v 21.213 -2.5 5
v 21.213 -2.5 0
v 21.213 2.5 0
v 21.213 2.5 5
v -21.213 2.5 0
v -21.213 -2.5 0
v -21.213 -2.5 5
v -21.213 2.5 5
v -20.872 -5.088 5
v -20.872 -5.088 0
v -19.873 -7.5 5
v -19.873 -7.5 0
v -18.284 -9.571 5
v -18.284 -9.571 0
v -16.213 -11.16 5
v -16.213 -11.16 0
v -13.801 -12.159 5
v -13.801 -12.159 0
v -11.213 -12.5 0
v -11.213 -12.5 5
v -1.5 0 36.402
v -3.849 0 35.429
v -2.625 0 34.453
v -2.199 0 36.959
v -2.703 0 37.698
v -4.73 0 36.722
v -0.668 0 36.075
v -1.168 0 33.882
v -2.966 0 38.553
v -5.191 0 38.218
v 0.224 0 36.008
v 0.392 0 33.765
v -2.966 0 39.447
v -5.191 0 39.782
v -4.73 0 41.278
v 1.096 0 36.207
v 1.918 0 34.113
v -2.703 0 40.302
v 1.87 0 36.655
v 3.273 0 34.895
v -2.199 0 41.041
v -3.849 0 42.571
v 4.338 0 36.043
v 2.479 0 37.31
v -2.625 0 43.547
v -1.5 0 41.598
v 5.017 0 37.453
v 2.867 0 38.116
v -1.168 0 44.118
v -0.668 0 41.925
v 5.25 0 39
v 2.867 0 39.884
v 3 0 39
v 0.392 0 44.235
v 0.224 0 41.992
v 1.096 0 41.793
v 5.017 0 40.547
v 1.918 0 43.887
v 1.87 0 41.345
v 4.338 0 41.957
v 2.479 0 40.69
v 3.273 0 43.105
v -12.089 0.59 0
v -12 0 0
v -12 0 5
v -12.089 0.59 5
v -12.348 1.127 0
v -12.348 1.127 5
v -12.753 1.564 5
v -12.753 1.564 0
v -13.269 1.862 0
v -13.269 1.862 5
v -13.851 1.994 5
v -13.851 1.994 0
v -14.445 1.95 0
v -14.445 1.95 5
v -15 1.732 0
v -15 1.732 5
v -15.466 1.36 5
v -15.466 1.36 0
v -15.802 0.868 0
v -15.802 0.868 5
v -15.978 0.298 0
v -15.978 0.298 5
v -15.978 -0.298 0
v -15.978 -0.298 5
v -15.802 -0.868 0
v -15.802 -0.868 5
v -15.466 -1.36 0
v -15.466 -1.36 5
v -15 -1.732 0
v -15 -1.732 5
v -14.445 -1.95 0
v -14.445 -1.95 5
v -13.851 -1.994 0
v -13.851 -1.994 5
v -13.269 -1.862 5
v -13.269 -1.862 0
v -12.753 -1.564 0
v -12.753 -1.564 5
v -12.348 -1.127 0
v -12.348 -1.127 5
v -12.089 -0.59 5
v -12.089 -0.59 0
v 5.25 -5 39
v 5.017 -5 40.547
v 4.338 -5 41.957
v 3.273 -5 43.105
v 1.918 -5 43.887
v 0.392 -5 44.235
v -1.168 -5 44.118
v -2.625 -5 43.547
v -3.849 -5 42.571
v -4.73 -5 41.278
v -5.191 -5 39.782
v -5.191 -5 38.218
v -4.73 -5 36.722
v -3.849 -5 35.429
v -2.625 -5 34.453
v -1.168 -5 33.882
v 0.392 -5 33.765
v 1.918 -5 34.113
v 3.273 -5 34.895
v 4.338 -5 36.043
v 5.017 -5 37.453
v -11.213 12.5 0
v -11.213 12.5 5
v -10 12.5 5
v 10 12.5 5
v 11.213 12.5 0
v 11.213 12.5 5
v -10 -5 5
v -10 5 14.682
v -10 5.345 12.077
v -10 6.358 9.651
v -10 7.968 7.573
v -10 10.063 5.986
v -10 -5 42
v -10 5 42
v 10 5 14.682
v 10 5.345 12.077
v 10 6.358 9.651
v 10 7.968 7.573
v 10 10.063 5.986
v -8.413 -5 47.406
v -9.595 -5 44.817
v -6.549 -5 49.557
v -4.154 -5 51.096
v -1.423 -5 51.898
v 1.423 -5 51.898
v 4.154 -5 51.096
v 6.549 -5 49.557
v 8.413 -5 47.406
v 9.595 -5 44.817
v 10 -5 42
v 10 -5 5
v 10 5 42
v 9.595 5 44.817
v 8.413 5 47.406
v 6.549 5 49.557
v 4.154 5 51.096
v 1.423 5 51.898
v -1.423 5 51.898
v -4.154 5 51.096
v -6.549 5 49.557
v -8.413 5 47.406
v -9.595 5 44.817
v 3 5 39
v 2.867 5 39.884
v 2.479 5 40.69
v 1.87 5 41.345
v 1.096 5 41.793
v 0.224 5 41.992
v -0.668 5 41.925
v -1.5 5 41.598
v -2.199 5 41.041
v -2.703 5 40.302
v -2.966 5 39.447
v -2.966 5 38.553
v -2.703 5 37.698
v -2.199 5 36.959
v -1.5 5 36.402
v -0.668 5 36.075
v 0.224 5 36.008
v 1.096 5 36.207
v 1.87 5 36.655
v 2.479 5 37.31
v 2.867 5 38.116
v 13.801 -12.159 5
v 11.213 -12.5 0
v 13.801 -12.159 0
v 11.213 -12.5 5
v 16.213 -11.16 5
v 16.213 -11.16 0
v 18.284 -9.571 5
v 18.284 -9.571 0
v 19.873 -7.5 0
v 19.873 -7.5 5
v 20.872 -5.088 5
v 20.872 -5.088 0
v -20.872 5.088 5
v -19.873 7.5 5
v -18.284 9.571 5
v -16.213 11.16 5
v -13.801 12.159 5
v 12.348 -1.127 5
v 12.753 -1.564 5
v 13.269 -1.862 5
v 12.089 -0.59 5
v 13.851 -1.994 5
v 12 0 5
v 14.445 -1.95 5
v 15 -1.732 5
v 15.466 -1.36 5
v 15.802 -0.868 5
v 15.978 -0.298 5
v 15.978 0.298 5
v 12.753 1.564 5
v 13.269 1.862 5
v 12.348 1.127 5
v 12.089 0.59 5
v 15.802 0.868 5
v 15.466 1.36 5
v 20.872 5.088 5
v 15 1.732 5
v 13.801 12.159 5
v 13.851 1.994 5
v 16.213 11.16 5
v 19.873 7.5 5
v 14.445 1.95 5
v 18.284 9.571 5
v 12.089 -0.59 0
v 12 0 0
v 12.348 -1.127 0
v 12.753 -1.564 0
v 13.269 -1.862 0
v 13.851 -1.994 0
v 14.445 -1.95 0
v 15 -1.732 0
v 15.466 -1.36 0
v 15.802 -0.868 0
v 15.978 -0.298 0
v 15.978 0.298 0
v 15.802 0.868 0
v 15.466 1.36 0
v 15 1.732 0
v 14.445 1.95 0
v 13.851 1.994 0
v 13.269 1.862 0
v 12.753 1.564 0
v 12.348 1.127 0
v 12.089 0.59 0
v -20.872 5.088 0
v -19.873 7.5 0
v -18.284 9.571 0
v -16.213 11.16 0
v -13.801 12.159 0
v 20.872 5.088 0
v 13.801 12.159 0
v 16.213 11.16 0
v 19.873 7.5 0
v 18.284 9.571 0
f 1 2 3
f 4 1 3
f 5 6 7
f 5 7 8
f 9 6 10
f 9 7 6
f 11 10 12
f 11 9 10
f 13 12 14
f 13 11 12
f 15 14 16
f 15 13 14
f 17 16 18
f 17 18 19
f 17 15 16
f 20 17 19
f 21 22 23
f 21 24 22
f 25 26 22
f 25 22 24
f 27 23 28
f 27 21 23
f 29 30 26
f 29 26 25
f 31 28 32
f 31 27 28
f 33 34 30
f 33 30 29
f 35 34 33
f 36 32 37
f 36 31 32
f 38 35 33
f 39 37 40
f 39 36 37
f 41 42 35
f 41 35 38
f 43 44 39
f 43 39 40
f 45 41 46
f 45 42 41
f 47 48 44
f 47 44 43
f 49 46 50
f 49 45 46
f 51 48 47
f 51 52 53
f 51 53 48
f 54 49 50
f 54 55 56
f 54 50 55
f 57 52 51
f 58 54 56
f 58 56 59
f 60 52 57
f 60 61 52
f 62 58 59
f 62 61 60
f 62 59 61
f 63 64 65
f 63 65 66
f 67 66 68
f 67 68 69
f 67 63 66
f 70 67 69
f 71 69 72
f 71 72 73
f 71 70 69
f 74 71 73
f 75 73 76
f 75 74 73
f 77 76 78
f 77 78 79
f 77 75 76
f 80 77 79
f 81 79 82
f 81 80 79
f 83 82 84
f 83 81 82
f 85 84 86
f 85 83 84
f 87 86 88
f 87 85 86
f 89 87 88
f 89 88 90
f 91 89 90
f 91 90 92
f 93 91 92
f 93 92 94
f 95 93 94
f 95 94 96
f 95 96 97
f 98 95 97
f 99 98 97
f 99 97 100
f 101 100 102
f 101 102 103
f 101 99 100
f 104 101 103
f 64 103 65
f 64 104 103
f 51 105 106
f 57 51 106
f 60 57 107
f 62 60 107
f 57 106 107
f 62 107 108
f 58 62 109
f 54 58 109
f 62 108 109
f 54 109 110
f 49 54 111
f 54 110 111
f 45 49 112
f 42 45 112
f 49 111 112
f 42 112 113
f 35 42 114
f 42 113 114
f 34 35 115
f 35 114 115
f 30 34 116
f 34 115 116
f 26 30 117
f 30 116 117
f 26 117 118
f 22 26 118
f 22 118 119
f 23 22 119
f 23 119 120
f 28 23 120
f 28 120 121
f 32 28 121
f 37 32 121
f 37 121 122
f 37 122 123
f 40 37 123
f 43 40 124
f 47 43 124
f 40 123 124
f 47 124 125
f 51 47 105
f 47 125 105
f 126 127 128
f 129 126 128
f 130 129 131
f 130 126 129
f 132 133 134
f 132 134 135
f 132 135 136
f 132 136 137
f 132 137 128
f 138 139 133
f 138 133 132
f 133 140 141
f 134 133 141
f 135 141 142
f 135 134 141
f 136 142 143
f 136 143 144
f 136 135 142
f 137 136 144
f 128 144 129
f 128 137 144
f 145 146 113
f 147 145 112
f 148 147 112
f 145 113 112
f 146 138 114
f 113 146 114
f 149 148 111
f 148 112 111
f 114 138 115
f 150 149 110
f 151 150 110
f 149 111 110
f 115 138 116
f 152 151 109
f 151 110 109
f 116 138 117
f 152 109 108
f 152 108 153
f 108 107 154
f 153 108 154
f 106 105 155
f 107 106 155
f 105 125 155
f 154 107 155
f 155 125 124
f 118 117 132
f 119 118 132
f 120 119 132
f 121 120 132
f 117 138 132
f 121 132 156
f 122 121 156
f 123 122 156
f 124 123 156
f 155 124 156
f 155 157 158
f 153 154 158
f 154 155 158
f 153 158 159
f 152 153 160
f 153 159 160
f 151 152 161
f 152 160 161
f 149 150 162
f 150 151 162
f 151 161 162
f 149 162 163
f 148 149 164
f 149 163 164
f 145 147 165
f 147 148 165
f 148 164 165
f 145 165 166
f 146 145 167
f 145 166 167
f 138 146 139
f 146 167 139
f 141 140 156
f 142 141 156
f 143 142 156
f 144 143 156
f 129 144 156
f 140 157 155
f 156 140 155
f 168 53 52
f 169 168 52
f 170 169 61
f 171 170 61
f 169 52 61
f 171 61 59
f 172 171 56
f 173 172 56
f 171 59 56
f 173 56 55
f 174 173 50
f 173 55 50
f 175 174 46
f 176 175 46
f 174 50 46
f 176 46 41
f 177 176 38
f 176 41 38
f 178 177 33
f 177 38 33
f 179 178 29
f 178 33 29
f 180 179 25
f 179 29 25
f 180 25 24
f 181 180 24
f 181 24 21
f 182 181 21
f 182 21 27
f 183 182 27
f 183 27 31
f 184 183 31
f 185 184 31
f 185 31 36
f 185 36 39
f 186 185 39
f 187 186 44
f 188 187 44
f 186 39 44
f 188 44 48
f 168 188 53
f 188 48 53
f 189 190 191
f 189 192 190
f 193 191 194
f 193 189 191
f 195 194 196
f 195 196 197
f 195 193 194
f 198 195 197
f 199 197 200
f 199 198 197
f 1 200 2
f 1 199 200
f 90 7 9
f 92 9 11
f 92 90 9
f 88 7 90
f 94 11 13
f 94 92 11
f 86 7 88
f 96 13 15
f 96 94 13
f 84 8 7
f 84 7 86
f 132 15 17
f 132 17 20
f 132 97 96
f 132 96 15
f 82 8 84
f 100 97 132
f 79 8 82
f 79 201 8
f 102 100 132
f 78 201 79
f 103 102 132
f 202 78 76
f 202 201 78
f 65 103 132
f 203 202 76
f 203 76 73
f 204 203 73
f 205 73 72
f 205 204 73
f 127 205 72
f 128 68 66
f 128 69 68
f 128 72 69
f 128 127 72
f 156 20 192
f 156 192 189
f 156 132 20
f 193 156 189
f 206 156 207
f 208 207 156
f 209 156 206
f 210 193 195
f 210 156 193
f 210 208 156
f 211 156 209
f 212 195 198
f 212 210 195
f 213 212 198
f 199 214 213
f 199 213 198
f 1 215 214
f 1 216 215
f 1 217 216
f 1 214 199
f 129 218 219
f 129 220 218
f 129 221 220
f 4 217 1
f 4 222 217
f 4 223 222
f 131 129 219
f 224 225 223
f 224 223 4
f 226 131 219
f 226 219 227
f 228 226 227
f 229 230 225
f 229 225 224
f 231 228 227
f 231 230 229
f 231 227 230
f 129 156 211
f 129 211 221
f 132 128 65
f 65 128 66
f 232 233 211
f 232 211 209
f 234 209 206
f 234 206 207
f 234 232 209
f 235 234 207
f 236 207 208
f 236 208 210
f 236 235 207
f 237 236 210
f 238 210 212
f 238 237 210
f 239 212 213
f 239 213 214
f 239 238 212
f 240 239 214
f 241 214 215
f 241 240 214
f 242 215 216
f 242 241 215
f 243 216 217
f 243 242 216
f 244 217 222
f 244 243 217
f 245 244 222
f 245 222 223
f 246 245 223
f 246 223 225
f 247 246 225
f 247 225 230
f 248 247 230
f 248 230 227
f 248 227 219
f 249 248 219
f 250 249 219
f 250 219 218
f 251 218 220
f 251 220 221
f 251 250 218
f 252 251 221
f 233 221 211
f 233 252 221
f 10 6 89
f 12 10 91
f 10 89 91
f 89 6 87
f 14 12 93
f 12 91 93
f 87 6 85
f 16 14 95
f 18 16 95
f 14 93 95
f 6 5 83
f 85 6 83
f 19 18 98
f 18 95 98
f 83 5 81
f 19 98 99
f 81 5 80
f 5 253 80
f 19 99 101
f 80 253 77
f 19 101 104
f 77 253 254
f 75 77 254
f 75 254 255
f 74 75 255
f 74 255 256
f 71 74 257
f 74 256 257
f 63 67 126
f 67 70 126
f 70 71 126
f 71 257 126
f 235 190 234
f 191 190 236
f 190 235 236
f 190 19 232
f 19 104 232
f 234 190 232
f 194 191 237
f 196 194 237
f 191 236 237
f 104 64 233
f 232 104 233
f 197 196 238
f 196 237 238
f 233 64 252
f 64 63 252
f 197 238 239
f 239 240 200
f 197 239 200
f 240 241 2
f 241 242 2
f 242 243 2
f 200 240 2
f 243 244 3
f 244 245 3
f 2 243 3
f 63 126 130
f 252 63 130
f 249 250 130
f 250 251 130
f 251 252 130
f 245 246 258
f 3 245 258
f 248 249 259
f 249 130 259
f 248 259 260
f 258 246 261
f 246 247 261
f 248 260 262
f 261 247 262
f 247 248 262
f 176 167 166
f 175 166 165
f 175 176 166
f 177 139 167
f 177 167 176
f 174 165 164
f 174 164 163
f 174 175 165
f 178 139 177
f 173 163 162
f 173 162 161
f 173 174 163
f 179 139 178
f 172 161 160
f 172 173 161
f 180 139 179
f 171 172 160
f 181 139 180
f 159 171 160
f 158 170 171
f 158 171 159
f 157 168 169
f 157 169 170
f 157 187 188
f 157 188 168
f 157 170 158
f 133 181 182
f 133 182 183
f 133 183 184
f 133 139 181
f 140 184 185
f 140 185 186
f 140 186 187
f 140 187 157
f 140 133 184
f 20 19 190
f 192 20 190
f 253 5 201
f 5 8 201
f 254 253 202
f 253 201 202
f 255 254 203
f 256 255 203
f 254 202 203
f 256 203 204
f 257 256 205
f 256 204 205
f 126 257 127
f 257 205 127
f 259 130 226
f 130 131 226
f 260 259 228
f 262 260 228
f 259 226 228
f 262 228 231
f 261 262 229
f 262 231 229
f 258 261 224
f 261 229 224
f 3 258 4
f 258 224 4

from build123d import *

# Parameters (mm, degrees)
SKETCH1_W           = 42.425590724
SKETCH1_H           = 25
SKETCH1_R           = 2
BOSS_EXTRUDE1_DEPTH = 5
FILLET1_R           = 10
SKETCH2_W           = 20
SKETCH2_H           = 10
BOSS_EXTRUDE2_DEPTH = 47
SKETCH3_R           = 5.25
CUT_EXTRUDE1_DEPTH  = 5
SKETCH4_R           = 3
CUT_EXTRUDE2_DEPTH  = 5
FILLET2_R           = 10


with BuildPart() as part:
    # Sketch1 → Boss-Extrude1 (new body)
    with BuildSketch(Plane.XY):
        Rectangle(SKETCH1_W, SKETCH1_H)
        with Locations((-14, 0)):
            Circle(SKETCH1_R, mode=Mode.SUBTRACT)
        with Locations(Location((14, 0, 0), (0, 0, 180))):
            Circle(SKETCH1_R, mode=Mode.SUBTRACT)
    extrude(amount=BOSS_EXTRUDE1_DEPTH)

    # Fillet1
    fillet1_edges = [part.edges().sort_by_distance(p)[0] for p in [
        (-21.212795362, 12.5, 2.5),
        (21.212795362, 12.5, 2.5),
        (21.212795362, -12.5, 2.5),
        (-21.212795362, -12.5, 2.5),
    ]]
    fillet(fillet1_edges, radius=FILLET1_R)

    # Sketch2 → Boss-Extrude2 (add)
    with BuildSketch(Plane.XY.offset(5)):
        Rectangle(SKETCH2_W, SKETCH2_H)
    extrude(amount=BOSS_EXTRUDE2_DEPTH)

    # Sketch3 → Cut-Extrude1 (cut)
    with BuildSketch(Plane.XZ.offset(5)):
        with Locations((0, 39)):
            Circle(SKETCH3_R)
    extrude(amount=-CUT_EXTRUDE1_DEPTH, mode=Mode.SUBTRACT)

    # Sketch4 → Cut-Extrude2 (cut)
    with BuildSketch(Plane.XZ):
        with Locations((0, 39)):
            Circle(SKETCH4_R)
    extrude(amount=-CUT_EXTRUDE2_DEPTH, mode=Mode.SUBTRACT)

    # Fillet2
    # the kernel refuses this fillet: 10 mm, written as the material it adds along each edge
    with BuildSketch(Plane(origin=(-10, 5, 5), x_dir=(0, 1, 0), z_dir=(1, 0, 0))) as fillet2_piece_1:
        with BuildLine():
            CenterArc((10, 9.682458366), FILLET2_R, 180, 75.522487814)
            Line((0, 9.682458366), (0, 0))
            Line((0, 0), (7.5, 0))
        make_face()
    extrude(amount=20)
    # the kernel refuses this fillet: 10 mm, written as the material it takes off along each edge
    with BuildSketch(Plane(origin=(-10, -30, 52), x_dir=(1, 0, 0), z_dir=(0, 1, 0))) as fillet2_2_piece_1:
        with BuildLine():
            CenterArc((FILLET2_R, FILLET2_R), FILLET2_R, 180, 90)
            Line((0, FILLET2_R), (0, 0))
            Line((0, 0), (FILLET2_R, 0))
        make_face()
    extrude(amount=60, mode=Mode.SUBTRACT)
    with BuildSketch(Plane(origin=(10, 30, 52), x_dir=(0, 0, -1), z_dir=(0, -1, 0))) as fillet2_2_piece_2:
        with BuildLine():
            CenterArc((FILLET2_R, -FILLET2_R), FILLET2_R, 90, 90)
            Line((0, -FILLET2_R), (0, 0))
            Line((0, 0), (FILLET2_R, 0))
        make_face()
    extrude(amount=60, mode=Mode.SUBTRACT)


solid = part.part
